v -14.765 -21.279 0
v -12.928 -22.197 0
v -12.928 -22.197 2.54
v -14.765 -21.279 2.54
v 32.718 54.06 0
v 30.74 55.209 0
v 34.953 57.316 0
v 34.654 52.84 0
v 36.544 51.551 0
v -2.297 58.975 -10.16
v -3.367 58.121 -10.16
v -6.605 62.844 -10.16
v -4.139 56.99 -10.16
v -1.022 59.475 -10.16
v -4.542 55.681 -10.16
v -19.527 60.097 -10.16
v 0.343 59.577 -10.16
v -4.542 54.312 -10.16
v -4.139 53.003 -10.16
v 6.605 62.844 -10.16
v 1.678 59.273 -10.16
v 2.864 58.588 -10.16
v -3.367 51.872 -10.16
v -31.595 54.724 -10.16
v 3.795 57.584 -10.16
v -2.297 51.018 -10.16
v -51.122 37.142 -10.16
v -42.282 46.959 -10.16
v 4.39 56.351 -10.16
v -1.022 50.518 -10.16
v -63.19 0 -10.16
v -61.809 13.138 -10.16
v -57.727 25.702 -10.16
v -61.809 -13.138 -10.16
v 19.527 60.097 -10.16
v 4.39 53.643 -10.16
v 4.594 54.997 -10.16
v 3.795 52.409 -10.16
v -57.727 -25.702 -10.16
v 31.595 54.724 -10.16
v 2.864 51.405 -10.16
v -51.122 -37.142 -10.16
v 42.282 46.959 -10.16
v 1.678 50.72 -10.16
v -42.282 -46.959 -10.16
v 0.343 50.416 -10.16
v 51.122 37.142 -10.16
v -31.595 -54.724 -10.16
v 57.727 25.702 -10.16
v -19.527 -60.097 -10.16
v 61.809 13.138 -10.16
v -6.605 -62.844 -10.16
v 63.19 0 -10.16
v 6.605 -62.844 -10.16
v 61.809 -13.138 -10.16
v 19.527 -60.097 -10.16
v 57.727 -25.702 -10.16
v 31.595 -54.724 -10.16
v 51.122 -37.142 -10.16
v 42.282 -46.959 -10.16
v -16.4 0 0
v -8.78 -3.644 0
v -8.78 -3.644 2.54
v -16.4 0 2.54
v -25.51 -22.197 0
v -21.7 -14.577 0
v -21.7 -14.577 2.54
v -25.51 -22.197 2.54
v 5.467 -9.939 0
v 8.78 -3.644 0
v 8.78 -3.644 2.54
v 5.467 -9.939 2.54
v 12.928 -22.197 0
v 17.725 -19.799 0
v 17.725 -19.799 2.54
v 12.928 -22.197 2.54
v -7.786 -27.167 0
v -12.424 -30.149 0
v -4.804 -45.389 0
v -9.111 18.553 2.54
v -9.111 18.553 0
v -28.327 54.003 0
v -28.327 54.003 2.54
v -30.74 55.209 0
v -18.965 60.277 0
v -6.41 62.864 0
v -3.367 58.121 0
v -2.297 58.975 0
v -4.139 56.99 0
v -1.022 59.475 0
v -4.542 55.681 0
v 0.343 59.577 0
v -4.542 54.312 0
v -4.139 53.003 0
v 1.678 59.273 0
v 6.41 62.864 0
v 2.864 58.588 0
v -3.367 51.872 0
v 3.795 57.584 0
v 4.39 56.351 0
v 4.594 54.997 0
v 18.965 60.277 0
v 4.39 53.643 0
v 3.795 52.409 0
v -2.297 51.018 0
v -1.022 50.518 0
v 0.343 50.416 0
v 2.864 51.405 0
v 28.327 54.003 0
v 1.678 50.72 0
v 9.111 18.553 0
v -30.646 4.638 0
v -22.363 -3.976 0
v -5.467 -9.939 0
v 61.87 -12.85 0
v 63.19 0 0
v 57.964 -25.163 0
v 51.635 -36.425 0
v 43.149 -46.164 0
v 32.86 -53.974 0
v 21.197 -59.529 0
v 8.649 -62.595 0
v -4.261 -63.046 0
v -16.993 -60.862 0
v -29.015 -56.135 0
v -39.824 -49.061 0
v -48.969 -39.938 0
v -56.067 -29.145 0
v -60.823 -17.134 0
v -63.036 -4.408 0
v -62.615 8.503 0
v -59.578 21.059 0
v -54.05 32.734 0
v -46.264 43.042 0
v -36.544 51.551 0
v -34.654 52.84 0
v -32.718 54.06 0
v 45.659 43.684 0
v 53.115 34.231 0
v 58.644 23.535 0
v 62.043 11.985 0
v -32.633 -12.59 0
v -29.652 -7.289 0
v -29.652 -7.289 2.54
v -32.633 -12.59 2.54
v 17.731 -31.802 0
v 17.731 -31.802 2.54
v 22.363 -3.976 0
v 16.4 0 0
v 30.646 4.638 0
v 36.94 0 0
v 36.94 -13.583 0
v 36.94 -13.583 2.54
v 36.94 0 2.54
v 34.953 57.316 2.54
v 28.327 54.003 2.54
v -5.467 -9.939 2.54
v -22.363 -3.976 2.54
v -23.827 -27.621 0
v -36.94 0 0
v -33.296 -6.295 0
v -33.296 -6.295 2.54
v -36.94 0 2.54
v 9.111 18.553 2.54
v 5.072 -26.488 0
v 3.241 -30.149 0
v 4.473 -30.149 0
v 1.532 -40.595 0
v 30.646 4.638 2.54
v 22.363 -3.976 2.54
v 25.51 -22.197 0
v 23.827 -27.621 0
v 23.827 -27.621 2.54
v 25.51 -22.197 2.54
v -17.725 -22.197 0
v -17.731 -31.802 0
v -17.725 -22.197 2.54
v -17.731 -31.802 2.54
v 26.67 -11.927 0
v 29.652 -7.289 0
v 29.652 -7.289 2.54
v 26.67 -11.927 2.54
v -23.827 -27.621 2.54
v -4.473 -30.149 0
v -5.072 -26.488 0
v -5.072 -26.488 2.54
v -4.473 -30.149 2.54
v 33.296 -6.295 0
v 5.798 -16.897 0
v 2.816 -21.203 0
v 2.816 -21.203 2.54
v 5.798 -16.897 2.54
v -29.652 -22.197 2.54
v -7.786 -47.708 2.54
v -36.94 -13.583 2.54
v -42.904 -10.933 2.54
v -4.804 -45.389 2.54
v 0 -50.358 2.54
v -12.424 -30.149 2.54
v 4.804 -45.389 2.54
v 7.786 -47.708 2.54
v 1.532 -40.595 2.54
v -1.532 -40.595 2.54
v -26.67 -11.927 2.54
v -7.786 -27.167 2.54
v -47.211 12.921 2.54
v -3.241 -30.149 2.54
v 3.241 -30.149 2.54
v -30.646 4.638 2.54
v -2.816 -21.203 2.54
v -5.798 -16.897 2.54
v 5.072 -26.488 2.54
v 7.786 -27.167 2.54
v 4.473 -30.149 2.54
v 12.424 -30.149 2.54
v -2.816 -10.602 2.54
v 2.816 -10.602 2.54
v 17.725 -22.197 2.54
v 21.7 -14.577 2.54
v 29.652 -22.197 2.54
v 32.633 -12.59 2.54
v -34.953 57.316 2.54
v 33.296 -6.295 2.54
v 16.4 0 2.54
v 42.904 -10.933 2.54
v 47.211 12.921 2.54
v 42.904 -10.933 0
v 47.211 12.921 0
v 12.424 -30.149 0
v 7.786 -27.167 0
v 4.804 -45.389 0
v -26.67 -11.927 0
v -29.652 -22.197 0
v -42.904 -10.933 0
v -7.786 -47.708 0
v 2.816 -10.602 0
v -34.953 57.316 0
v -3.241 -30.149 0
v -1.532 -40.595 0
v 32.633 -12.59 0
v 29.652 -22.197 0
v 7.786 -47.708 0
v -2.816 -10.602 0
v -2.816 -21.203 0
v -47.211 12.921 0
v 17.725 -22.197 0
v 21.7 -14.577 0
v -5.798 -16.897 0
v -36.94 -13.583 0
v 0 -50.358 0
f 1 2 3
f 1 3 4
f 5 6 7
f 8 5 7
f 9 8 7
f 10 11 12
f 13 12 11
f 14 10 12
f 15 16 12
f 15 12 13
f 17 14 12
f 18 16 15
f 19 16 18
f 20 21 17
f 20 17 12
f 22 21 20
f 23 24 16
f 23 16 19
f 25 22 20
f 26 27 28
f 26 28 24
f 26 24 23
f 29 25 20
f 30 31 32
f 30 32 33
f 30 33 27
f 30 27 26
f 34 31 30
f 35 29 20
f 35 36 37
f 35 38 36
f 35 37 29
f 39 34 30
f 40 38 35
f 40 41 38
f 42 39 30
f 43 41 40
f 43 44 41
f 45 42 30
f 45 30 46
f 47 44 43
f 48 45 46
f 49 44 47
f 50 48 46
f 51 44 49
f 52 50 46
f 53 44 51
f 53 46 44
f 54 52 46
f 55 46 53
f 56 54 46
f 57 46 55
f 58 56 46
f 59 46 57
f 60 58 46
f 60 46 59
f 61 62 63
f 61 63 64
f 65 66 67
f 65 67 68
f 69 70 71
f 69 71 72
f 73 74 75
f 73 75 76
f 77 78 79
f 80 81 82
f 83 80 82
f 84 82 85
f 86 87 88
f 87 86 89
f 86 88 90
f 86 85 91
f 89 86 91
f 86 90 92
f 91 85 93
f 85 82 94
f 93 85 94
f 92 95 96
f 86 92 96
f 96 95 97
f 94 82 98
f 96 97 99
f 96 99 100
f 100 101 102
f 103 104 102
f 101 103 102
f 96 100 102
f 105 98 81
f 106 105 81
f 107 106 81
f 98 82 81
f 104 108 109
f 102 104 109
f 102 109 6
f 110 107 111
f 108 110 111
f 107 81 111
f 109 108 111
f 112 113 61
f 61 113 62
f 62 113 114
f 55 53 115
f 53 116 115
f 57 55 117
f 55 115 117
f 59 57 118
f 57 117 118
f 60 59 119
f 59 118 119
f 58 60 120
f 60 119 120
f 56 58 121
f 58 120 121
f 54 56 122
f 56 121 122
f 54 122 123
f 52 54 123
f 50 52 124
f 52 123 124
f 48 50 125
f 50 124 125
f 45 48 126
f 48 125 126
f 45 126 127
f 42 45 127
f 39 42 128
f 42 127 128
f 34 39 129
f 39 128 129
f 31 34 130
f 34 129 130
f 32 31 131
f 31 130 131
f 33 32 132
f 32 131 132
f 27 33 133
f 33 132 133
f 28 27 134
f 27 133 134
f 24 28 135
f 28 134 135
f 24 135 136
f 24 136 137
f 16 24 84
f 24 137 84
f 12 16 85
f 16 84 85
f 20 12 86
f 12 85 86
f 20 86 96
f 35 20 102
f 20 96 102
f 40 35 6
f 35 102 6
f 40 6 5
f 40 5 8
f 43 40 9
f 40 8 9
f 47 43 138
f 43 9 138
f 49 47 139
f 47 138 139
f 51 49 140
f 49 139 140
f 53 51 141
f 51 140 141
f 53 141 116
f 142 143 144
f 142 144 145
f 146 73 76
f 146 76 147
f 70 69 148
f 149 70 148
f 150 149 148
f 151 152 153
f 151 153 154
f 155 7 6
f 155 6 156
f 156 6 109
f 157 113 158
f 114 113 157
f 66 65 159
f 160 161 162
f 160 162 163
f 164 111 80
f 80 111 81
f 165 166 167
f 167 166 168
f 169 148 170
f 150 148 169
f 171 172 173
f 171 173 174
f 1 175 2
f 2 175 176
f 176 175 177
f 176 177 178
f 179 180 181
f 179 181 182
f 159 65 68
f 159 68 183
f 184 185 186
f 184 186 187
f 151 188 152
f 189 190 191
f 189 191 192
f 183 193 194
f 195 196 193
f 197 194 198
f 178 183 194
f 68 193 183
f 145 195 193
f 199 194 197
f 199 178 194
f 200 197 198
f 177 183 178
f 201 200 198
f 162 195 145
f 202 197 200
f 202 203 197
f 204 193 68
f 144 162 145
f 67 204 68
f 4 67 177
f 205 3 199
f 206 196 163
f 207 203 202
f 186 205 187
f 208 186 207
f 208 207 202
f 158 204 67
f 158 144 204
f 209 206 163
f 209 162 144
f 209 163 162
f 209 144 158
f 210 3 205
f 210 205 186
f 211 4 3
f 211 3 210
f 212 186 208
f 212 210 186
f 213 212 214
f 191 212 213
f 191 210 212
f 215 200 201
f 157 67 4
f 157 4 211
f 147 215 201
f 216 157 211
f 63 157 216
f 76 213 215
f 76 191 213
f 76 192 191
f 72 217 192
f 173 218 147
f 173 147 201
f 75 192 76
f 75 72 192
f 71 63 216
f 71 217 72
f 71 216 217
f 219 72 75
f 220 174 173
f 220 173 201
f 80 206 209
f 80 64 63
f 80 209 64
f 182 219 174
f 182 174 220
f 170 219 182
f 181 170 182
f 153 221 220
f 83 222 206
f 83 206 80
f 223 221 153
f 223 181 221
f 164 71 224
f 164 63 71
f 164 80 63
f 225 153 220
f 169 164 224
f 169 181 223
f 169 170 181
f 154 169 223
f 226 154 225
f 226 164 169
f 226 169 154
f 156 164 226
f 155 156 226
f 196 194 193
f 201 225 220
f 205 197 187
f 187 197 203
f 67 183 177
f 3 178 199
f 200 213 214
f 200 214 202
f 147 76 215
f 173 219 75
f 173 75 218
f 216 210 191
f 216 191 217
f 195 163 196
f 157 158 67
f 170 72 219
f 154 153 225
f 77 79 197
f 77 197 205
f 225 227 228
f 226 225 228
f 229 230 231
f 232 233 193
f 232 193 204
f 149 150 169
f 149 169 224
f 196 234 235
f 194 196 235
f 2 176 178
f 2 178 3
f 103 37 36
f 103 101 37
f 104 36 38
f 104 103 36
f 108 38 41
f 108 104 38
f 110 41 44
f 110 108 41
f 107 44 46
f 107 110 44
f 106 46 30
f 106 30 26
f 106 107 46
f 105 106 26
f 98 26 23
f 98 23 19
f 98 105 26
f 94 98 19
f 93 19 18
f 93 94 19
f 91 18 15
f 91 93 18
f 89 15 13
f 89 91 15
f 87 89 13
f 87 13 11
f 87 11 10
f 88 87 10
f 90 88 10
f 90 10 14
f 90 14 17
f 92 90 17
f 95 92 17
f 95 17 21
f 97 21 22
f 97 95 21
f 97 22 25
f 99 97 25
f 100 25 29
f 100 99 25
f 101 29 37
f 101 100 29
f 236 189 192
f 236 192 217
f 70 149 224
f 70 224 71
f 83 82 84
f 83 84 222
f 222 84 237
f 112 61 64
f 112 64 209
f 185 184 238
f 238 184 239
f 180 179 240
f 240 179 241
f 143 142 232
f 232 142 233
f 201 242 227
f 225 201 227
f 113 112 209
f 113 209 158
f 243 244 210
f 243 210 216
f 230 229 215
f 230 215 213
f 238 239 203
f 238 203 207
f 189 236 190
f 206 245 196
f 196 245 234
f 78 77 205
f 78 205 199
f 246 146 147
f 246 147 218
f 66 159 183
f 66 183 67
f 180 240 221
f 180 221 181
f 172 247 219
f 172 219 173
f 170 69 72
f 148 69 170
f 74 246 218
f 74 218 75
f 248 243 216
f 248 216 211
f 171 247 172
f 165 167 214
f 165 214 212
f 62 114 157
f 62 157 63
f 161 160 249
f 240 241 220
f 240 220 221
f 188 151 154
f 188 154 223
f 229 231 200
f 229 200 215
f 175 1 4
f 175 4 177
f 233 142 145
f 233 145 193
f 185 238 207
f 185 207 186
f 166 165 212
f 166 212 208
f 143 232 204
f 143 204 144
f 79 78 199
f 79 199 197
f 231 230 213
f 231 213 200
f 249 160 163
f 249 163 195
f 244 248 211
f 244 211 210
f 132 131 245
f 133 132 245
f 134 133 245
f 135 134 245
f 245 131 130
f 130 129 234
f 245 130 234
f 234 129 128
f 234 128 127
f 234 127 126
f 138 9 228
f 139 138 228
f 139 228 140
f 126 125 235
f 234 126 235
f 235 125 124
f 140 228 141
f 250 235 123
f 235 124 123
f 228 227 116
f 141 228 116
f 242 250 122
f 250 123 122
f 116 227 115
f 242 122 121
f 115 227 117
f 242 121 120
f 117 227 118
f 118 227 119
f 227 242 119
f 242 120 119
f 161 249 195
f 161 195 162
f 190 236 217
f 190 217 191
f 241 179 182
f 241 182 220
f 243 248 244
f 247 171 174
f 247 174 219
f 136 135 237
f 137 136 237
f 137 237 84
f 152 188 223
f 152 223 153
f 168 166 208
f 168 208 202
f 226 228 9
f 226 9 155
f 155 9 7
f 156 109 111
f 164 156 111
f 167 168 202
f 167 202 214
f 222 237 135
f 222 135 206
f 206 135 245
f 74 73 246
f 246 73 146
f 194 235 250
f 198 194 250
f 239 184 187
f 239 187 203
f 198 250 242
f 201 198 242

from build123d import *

# Parameters (mm, degrees)
F1_DEPTH    = 2.54
F3_DEPTH    = 86.106
F5_DEPTH    = 95.25
F7_DEPTH    = 55.626
F8_R        = 63.189953
F9_DEPTH    = 2.54
F10_R       = 4.593675
F11_DEPTH   = 25.4
F9_FACE_R   = 63.189953
F9_FACE_R_2 = 4.593675
F12_DEPTH   = 7.62


with BuildPart() as f1:
    # F0 (on Top) → F1 (new body)
    with BuildSketch(Plane.XY):
        Polygon((9.110871, 18.553045), (0, 18.553045), (-9.110871, 18.553045), (-28.326523, 54.002609), (-34.952607, 57.315651), (-47.210872, 12.92087), (-42.903915, -10.933043), (-7.785654, -47.707826), (0, -50.358262), (7.785654, -47.707826), (42.903915, -10.933043), (47.210872, 12.92087), (34.952607, 57.315651), (28.326523, 54.002609), align=None)
    extrude(amount=F1_DEPTH)

    # F2 (on Top) → F3 (cut)
    with BuildSketch(Plane.XY):
        Polygon((-5.466522, -9.93913), (-8.779565, -3.644348), (-16.399564, 0), (-30.645652, 4.638261), (-22.363044, -3.975652), align=None)
        Polygon((8.779565, -3.644348), (5.466522, -9.93913), (22.363044, -3.975652), (30.645652, 4.638261), (16.399564, 0), align=None)
    extrude(amount=F3_DEPTH, mode=Mode.SUBTRACT)

    # F4 (on Top) → F5 (cut)
    with BuildSketch(Plane.XY):
        Polygon((-36.940437, -13.583479), (-33.296086, -6.294783), (-36.940437, 0), (-36.940437, -5.632174), align=None)
        Polygon((-29.651739, -22.197392), (-26.670001, -11.926956), (-29.651739, -7.288696), (-32.633476, -12.589565), align=None)
        Polygon((-23.827148, -27.621334), (-21.700436, -14.577392), (-25.51044, -22.197392), align=None)
        Polygon((-14.765322, -21.278939), (-17.724782, -22.197392), (-17.730825, -31.802197), (-12.928419, -22.197392), align=None)
        Polygon((-7.785654, -27.166957), (-12.423914, -30.148696), (-4.803916, -45.388699), align=None)
        Polygon((12.423914, -30.148696), (7.785654, -27.166957), (4.803916, -45.388699), align=None)
        Polygon((17.724782, -19.799208), (12.928419, -22.197392), (17.730825, -31.802197), (17.724782, -22.197392), align=None)
        Polygon((21.700436, -14.577392), (23.827148, -27.621334), (25.51044, -22.197392), align=None)
        Polygon((26.670001, -11.926956), (29.651739, -22.197392), (32.633476, -12.589565), (29.651739, -7.288696), align=None)
        Polygon((33.296086, -6.294783), (36.940437, -13.583479), (36.940437, -5.632174), (36.940437, 0), align=None)
        Polygon((-5.071647, -26.487922), (-4.472611, -30.148696), (-1.531945, -40.594514), (-3.24126, -30.148696), align=None)
        Polygon((3.24126, -30.148696), (1.531945, -40.594514), (4.472611, -30.148696), (5.071647, -26.487922), align=None)
    extrude(amount=F5_DEPTH, mode=Mode.SUBTRACT)

    # F6 (on Top) → F7 (cut)
    with BuildSketch(Plane.XY):
        Polygon((-2.816088, -21.203479), (-2.816088, -10.601739), (-5.797826, -16.896522), align=None)
        Polygon((2.816088, -10.601739), (2.816088, -21.203479), (5.797826, -16.896522), align=None)
    extrude(amount=F7_DEPTH, mode=Mode.SUBTRACT)

    # F8 (on face) → F9 (join)
    with BuildSketch(Plane(origin=(0, 0, 0), x_dir=(1, 0, 0), z_dir=(0, 0, -1))):
        Circle(F8_R)
    extrude(amount=F9_DEPTH)

    # F10 (on face) → F11 (cut)
    with BuildSketch(Plane.XY):
        with Locations((0, 54.996524)):
            Circle(F10_R)
    extrude(amount=-F11_DEPTH, mode=Mode.SUBTRACT)

    # F9_face (on face) → F12 (join)
    with BuildSketch(Plane(origin=(0, -0.292187, -2.54), x_dir=(1, 0, 0), z_dir=(0, 0, -1))):
        with Locations((0, -0.292187)):
            Circle(F9_FACE_R)
        with Locations((0, -55.288711)):
            Circle(F9_FACE_R_2, mode=Mode.SUBTRACT)
    extrude(amount=F12_DEPTH)


solid = f1.part
